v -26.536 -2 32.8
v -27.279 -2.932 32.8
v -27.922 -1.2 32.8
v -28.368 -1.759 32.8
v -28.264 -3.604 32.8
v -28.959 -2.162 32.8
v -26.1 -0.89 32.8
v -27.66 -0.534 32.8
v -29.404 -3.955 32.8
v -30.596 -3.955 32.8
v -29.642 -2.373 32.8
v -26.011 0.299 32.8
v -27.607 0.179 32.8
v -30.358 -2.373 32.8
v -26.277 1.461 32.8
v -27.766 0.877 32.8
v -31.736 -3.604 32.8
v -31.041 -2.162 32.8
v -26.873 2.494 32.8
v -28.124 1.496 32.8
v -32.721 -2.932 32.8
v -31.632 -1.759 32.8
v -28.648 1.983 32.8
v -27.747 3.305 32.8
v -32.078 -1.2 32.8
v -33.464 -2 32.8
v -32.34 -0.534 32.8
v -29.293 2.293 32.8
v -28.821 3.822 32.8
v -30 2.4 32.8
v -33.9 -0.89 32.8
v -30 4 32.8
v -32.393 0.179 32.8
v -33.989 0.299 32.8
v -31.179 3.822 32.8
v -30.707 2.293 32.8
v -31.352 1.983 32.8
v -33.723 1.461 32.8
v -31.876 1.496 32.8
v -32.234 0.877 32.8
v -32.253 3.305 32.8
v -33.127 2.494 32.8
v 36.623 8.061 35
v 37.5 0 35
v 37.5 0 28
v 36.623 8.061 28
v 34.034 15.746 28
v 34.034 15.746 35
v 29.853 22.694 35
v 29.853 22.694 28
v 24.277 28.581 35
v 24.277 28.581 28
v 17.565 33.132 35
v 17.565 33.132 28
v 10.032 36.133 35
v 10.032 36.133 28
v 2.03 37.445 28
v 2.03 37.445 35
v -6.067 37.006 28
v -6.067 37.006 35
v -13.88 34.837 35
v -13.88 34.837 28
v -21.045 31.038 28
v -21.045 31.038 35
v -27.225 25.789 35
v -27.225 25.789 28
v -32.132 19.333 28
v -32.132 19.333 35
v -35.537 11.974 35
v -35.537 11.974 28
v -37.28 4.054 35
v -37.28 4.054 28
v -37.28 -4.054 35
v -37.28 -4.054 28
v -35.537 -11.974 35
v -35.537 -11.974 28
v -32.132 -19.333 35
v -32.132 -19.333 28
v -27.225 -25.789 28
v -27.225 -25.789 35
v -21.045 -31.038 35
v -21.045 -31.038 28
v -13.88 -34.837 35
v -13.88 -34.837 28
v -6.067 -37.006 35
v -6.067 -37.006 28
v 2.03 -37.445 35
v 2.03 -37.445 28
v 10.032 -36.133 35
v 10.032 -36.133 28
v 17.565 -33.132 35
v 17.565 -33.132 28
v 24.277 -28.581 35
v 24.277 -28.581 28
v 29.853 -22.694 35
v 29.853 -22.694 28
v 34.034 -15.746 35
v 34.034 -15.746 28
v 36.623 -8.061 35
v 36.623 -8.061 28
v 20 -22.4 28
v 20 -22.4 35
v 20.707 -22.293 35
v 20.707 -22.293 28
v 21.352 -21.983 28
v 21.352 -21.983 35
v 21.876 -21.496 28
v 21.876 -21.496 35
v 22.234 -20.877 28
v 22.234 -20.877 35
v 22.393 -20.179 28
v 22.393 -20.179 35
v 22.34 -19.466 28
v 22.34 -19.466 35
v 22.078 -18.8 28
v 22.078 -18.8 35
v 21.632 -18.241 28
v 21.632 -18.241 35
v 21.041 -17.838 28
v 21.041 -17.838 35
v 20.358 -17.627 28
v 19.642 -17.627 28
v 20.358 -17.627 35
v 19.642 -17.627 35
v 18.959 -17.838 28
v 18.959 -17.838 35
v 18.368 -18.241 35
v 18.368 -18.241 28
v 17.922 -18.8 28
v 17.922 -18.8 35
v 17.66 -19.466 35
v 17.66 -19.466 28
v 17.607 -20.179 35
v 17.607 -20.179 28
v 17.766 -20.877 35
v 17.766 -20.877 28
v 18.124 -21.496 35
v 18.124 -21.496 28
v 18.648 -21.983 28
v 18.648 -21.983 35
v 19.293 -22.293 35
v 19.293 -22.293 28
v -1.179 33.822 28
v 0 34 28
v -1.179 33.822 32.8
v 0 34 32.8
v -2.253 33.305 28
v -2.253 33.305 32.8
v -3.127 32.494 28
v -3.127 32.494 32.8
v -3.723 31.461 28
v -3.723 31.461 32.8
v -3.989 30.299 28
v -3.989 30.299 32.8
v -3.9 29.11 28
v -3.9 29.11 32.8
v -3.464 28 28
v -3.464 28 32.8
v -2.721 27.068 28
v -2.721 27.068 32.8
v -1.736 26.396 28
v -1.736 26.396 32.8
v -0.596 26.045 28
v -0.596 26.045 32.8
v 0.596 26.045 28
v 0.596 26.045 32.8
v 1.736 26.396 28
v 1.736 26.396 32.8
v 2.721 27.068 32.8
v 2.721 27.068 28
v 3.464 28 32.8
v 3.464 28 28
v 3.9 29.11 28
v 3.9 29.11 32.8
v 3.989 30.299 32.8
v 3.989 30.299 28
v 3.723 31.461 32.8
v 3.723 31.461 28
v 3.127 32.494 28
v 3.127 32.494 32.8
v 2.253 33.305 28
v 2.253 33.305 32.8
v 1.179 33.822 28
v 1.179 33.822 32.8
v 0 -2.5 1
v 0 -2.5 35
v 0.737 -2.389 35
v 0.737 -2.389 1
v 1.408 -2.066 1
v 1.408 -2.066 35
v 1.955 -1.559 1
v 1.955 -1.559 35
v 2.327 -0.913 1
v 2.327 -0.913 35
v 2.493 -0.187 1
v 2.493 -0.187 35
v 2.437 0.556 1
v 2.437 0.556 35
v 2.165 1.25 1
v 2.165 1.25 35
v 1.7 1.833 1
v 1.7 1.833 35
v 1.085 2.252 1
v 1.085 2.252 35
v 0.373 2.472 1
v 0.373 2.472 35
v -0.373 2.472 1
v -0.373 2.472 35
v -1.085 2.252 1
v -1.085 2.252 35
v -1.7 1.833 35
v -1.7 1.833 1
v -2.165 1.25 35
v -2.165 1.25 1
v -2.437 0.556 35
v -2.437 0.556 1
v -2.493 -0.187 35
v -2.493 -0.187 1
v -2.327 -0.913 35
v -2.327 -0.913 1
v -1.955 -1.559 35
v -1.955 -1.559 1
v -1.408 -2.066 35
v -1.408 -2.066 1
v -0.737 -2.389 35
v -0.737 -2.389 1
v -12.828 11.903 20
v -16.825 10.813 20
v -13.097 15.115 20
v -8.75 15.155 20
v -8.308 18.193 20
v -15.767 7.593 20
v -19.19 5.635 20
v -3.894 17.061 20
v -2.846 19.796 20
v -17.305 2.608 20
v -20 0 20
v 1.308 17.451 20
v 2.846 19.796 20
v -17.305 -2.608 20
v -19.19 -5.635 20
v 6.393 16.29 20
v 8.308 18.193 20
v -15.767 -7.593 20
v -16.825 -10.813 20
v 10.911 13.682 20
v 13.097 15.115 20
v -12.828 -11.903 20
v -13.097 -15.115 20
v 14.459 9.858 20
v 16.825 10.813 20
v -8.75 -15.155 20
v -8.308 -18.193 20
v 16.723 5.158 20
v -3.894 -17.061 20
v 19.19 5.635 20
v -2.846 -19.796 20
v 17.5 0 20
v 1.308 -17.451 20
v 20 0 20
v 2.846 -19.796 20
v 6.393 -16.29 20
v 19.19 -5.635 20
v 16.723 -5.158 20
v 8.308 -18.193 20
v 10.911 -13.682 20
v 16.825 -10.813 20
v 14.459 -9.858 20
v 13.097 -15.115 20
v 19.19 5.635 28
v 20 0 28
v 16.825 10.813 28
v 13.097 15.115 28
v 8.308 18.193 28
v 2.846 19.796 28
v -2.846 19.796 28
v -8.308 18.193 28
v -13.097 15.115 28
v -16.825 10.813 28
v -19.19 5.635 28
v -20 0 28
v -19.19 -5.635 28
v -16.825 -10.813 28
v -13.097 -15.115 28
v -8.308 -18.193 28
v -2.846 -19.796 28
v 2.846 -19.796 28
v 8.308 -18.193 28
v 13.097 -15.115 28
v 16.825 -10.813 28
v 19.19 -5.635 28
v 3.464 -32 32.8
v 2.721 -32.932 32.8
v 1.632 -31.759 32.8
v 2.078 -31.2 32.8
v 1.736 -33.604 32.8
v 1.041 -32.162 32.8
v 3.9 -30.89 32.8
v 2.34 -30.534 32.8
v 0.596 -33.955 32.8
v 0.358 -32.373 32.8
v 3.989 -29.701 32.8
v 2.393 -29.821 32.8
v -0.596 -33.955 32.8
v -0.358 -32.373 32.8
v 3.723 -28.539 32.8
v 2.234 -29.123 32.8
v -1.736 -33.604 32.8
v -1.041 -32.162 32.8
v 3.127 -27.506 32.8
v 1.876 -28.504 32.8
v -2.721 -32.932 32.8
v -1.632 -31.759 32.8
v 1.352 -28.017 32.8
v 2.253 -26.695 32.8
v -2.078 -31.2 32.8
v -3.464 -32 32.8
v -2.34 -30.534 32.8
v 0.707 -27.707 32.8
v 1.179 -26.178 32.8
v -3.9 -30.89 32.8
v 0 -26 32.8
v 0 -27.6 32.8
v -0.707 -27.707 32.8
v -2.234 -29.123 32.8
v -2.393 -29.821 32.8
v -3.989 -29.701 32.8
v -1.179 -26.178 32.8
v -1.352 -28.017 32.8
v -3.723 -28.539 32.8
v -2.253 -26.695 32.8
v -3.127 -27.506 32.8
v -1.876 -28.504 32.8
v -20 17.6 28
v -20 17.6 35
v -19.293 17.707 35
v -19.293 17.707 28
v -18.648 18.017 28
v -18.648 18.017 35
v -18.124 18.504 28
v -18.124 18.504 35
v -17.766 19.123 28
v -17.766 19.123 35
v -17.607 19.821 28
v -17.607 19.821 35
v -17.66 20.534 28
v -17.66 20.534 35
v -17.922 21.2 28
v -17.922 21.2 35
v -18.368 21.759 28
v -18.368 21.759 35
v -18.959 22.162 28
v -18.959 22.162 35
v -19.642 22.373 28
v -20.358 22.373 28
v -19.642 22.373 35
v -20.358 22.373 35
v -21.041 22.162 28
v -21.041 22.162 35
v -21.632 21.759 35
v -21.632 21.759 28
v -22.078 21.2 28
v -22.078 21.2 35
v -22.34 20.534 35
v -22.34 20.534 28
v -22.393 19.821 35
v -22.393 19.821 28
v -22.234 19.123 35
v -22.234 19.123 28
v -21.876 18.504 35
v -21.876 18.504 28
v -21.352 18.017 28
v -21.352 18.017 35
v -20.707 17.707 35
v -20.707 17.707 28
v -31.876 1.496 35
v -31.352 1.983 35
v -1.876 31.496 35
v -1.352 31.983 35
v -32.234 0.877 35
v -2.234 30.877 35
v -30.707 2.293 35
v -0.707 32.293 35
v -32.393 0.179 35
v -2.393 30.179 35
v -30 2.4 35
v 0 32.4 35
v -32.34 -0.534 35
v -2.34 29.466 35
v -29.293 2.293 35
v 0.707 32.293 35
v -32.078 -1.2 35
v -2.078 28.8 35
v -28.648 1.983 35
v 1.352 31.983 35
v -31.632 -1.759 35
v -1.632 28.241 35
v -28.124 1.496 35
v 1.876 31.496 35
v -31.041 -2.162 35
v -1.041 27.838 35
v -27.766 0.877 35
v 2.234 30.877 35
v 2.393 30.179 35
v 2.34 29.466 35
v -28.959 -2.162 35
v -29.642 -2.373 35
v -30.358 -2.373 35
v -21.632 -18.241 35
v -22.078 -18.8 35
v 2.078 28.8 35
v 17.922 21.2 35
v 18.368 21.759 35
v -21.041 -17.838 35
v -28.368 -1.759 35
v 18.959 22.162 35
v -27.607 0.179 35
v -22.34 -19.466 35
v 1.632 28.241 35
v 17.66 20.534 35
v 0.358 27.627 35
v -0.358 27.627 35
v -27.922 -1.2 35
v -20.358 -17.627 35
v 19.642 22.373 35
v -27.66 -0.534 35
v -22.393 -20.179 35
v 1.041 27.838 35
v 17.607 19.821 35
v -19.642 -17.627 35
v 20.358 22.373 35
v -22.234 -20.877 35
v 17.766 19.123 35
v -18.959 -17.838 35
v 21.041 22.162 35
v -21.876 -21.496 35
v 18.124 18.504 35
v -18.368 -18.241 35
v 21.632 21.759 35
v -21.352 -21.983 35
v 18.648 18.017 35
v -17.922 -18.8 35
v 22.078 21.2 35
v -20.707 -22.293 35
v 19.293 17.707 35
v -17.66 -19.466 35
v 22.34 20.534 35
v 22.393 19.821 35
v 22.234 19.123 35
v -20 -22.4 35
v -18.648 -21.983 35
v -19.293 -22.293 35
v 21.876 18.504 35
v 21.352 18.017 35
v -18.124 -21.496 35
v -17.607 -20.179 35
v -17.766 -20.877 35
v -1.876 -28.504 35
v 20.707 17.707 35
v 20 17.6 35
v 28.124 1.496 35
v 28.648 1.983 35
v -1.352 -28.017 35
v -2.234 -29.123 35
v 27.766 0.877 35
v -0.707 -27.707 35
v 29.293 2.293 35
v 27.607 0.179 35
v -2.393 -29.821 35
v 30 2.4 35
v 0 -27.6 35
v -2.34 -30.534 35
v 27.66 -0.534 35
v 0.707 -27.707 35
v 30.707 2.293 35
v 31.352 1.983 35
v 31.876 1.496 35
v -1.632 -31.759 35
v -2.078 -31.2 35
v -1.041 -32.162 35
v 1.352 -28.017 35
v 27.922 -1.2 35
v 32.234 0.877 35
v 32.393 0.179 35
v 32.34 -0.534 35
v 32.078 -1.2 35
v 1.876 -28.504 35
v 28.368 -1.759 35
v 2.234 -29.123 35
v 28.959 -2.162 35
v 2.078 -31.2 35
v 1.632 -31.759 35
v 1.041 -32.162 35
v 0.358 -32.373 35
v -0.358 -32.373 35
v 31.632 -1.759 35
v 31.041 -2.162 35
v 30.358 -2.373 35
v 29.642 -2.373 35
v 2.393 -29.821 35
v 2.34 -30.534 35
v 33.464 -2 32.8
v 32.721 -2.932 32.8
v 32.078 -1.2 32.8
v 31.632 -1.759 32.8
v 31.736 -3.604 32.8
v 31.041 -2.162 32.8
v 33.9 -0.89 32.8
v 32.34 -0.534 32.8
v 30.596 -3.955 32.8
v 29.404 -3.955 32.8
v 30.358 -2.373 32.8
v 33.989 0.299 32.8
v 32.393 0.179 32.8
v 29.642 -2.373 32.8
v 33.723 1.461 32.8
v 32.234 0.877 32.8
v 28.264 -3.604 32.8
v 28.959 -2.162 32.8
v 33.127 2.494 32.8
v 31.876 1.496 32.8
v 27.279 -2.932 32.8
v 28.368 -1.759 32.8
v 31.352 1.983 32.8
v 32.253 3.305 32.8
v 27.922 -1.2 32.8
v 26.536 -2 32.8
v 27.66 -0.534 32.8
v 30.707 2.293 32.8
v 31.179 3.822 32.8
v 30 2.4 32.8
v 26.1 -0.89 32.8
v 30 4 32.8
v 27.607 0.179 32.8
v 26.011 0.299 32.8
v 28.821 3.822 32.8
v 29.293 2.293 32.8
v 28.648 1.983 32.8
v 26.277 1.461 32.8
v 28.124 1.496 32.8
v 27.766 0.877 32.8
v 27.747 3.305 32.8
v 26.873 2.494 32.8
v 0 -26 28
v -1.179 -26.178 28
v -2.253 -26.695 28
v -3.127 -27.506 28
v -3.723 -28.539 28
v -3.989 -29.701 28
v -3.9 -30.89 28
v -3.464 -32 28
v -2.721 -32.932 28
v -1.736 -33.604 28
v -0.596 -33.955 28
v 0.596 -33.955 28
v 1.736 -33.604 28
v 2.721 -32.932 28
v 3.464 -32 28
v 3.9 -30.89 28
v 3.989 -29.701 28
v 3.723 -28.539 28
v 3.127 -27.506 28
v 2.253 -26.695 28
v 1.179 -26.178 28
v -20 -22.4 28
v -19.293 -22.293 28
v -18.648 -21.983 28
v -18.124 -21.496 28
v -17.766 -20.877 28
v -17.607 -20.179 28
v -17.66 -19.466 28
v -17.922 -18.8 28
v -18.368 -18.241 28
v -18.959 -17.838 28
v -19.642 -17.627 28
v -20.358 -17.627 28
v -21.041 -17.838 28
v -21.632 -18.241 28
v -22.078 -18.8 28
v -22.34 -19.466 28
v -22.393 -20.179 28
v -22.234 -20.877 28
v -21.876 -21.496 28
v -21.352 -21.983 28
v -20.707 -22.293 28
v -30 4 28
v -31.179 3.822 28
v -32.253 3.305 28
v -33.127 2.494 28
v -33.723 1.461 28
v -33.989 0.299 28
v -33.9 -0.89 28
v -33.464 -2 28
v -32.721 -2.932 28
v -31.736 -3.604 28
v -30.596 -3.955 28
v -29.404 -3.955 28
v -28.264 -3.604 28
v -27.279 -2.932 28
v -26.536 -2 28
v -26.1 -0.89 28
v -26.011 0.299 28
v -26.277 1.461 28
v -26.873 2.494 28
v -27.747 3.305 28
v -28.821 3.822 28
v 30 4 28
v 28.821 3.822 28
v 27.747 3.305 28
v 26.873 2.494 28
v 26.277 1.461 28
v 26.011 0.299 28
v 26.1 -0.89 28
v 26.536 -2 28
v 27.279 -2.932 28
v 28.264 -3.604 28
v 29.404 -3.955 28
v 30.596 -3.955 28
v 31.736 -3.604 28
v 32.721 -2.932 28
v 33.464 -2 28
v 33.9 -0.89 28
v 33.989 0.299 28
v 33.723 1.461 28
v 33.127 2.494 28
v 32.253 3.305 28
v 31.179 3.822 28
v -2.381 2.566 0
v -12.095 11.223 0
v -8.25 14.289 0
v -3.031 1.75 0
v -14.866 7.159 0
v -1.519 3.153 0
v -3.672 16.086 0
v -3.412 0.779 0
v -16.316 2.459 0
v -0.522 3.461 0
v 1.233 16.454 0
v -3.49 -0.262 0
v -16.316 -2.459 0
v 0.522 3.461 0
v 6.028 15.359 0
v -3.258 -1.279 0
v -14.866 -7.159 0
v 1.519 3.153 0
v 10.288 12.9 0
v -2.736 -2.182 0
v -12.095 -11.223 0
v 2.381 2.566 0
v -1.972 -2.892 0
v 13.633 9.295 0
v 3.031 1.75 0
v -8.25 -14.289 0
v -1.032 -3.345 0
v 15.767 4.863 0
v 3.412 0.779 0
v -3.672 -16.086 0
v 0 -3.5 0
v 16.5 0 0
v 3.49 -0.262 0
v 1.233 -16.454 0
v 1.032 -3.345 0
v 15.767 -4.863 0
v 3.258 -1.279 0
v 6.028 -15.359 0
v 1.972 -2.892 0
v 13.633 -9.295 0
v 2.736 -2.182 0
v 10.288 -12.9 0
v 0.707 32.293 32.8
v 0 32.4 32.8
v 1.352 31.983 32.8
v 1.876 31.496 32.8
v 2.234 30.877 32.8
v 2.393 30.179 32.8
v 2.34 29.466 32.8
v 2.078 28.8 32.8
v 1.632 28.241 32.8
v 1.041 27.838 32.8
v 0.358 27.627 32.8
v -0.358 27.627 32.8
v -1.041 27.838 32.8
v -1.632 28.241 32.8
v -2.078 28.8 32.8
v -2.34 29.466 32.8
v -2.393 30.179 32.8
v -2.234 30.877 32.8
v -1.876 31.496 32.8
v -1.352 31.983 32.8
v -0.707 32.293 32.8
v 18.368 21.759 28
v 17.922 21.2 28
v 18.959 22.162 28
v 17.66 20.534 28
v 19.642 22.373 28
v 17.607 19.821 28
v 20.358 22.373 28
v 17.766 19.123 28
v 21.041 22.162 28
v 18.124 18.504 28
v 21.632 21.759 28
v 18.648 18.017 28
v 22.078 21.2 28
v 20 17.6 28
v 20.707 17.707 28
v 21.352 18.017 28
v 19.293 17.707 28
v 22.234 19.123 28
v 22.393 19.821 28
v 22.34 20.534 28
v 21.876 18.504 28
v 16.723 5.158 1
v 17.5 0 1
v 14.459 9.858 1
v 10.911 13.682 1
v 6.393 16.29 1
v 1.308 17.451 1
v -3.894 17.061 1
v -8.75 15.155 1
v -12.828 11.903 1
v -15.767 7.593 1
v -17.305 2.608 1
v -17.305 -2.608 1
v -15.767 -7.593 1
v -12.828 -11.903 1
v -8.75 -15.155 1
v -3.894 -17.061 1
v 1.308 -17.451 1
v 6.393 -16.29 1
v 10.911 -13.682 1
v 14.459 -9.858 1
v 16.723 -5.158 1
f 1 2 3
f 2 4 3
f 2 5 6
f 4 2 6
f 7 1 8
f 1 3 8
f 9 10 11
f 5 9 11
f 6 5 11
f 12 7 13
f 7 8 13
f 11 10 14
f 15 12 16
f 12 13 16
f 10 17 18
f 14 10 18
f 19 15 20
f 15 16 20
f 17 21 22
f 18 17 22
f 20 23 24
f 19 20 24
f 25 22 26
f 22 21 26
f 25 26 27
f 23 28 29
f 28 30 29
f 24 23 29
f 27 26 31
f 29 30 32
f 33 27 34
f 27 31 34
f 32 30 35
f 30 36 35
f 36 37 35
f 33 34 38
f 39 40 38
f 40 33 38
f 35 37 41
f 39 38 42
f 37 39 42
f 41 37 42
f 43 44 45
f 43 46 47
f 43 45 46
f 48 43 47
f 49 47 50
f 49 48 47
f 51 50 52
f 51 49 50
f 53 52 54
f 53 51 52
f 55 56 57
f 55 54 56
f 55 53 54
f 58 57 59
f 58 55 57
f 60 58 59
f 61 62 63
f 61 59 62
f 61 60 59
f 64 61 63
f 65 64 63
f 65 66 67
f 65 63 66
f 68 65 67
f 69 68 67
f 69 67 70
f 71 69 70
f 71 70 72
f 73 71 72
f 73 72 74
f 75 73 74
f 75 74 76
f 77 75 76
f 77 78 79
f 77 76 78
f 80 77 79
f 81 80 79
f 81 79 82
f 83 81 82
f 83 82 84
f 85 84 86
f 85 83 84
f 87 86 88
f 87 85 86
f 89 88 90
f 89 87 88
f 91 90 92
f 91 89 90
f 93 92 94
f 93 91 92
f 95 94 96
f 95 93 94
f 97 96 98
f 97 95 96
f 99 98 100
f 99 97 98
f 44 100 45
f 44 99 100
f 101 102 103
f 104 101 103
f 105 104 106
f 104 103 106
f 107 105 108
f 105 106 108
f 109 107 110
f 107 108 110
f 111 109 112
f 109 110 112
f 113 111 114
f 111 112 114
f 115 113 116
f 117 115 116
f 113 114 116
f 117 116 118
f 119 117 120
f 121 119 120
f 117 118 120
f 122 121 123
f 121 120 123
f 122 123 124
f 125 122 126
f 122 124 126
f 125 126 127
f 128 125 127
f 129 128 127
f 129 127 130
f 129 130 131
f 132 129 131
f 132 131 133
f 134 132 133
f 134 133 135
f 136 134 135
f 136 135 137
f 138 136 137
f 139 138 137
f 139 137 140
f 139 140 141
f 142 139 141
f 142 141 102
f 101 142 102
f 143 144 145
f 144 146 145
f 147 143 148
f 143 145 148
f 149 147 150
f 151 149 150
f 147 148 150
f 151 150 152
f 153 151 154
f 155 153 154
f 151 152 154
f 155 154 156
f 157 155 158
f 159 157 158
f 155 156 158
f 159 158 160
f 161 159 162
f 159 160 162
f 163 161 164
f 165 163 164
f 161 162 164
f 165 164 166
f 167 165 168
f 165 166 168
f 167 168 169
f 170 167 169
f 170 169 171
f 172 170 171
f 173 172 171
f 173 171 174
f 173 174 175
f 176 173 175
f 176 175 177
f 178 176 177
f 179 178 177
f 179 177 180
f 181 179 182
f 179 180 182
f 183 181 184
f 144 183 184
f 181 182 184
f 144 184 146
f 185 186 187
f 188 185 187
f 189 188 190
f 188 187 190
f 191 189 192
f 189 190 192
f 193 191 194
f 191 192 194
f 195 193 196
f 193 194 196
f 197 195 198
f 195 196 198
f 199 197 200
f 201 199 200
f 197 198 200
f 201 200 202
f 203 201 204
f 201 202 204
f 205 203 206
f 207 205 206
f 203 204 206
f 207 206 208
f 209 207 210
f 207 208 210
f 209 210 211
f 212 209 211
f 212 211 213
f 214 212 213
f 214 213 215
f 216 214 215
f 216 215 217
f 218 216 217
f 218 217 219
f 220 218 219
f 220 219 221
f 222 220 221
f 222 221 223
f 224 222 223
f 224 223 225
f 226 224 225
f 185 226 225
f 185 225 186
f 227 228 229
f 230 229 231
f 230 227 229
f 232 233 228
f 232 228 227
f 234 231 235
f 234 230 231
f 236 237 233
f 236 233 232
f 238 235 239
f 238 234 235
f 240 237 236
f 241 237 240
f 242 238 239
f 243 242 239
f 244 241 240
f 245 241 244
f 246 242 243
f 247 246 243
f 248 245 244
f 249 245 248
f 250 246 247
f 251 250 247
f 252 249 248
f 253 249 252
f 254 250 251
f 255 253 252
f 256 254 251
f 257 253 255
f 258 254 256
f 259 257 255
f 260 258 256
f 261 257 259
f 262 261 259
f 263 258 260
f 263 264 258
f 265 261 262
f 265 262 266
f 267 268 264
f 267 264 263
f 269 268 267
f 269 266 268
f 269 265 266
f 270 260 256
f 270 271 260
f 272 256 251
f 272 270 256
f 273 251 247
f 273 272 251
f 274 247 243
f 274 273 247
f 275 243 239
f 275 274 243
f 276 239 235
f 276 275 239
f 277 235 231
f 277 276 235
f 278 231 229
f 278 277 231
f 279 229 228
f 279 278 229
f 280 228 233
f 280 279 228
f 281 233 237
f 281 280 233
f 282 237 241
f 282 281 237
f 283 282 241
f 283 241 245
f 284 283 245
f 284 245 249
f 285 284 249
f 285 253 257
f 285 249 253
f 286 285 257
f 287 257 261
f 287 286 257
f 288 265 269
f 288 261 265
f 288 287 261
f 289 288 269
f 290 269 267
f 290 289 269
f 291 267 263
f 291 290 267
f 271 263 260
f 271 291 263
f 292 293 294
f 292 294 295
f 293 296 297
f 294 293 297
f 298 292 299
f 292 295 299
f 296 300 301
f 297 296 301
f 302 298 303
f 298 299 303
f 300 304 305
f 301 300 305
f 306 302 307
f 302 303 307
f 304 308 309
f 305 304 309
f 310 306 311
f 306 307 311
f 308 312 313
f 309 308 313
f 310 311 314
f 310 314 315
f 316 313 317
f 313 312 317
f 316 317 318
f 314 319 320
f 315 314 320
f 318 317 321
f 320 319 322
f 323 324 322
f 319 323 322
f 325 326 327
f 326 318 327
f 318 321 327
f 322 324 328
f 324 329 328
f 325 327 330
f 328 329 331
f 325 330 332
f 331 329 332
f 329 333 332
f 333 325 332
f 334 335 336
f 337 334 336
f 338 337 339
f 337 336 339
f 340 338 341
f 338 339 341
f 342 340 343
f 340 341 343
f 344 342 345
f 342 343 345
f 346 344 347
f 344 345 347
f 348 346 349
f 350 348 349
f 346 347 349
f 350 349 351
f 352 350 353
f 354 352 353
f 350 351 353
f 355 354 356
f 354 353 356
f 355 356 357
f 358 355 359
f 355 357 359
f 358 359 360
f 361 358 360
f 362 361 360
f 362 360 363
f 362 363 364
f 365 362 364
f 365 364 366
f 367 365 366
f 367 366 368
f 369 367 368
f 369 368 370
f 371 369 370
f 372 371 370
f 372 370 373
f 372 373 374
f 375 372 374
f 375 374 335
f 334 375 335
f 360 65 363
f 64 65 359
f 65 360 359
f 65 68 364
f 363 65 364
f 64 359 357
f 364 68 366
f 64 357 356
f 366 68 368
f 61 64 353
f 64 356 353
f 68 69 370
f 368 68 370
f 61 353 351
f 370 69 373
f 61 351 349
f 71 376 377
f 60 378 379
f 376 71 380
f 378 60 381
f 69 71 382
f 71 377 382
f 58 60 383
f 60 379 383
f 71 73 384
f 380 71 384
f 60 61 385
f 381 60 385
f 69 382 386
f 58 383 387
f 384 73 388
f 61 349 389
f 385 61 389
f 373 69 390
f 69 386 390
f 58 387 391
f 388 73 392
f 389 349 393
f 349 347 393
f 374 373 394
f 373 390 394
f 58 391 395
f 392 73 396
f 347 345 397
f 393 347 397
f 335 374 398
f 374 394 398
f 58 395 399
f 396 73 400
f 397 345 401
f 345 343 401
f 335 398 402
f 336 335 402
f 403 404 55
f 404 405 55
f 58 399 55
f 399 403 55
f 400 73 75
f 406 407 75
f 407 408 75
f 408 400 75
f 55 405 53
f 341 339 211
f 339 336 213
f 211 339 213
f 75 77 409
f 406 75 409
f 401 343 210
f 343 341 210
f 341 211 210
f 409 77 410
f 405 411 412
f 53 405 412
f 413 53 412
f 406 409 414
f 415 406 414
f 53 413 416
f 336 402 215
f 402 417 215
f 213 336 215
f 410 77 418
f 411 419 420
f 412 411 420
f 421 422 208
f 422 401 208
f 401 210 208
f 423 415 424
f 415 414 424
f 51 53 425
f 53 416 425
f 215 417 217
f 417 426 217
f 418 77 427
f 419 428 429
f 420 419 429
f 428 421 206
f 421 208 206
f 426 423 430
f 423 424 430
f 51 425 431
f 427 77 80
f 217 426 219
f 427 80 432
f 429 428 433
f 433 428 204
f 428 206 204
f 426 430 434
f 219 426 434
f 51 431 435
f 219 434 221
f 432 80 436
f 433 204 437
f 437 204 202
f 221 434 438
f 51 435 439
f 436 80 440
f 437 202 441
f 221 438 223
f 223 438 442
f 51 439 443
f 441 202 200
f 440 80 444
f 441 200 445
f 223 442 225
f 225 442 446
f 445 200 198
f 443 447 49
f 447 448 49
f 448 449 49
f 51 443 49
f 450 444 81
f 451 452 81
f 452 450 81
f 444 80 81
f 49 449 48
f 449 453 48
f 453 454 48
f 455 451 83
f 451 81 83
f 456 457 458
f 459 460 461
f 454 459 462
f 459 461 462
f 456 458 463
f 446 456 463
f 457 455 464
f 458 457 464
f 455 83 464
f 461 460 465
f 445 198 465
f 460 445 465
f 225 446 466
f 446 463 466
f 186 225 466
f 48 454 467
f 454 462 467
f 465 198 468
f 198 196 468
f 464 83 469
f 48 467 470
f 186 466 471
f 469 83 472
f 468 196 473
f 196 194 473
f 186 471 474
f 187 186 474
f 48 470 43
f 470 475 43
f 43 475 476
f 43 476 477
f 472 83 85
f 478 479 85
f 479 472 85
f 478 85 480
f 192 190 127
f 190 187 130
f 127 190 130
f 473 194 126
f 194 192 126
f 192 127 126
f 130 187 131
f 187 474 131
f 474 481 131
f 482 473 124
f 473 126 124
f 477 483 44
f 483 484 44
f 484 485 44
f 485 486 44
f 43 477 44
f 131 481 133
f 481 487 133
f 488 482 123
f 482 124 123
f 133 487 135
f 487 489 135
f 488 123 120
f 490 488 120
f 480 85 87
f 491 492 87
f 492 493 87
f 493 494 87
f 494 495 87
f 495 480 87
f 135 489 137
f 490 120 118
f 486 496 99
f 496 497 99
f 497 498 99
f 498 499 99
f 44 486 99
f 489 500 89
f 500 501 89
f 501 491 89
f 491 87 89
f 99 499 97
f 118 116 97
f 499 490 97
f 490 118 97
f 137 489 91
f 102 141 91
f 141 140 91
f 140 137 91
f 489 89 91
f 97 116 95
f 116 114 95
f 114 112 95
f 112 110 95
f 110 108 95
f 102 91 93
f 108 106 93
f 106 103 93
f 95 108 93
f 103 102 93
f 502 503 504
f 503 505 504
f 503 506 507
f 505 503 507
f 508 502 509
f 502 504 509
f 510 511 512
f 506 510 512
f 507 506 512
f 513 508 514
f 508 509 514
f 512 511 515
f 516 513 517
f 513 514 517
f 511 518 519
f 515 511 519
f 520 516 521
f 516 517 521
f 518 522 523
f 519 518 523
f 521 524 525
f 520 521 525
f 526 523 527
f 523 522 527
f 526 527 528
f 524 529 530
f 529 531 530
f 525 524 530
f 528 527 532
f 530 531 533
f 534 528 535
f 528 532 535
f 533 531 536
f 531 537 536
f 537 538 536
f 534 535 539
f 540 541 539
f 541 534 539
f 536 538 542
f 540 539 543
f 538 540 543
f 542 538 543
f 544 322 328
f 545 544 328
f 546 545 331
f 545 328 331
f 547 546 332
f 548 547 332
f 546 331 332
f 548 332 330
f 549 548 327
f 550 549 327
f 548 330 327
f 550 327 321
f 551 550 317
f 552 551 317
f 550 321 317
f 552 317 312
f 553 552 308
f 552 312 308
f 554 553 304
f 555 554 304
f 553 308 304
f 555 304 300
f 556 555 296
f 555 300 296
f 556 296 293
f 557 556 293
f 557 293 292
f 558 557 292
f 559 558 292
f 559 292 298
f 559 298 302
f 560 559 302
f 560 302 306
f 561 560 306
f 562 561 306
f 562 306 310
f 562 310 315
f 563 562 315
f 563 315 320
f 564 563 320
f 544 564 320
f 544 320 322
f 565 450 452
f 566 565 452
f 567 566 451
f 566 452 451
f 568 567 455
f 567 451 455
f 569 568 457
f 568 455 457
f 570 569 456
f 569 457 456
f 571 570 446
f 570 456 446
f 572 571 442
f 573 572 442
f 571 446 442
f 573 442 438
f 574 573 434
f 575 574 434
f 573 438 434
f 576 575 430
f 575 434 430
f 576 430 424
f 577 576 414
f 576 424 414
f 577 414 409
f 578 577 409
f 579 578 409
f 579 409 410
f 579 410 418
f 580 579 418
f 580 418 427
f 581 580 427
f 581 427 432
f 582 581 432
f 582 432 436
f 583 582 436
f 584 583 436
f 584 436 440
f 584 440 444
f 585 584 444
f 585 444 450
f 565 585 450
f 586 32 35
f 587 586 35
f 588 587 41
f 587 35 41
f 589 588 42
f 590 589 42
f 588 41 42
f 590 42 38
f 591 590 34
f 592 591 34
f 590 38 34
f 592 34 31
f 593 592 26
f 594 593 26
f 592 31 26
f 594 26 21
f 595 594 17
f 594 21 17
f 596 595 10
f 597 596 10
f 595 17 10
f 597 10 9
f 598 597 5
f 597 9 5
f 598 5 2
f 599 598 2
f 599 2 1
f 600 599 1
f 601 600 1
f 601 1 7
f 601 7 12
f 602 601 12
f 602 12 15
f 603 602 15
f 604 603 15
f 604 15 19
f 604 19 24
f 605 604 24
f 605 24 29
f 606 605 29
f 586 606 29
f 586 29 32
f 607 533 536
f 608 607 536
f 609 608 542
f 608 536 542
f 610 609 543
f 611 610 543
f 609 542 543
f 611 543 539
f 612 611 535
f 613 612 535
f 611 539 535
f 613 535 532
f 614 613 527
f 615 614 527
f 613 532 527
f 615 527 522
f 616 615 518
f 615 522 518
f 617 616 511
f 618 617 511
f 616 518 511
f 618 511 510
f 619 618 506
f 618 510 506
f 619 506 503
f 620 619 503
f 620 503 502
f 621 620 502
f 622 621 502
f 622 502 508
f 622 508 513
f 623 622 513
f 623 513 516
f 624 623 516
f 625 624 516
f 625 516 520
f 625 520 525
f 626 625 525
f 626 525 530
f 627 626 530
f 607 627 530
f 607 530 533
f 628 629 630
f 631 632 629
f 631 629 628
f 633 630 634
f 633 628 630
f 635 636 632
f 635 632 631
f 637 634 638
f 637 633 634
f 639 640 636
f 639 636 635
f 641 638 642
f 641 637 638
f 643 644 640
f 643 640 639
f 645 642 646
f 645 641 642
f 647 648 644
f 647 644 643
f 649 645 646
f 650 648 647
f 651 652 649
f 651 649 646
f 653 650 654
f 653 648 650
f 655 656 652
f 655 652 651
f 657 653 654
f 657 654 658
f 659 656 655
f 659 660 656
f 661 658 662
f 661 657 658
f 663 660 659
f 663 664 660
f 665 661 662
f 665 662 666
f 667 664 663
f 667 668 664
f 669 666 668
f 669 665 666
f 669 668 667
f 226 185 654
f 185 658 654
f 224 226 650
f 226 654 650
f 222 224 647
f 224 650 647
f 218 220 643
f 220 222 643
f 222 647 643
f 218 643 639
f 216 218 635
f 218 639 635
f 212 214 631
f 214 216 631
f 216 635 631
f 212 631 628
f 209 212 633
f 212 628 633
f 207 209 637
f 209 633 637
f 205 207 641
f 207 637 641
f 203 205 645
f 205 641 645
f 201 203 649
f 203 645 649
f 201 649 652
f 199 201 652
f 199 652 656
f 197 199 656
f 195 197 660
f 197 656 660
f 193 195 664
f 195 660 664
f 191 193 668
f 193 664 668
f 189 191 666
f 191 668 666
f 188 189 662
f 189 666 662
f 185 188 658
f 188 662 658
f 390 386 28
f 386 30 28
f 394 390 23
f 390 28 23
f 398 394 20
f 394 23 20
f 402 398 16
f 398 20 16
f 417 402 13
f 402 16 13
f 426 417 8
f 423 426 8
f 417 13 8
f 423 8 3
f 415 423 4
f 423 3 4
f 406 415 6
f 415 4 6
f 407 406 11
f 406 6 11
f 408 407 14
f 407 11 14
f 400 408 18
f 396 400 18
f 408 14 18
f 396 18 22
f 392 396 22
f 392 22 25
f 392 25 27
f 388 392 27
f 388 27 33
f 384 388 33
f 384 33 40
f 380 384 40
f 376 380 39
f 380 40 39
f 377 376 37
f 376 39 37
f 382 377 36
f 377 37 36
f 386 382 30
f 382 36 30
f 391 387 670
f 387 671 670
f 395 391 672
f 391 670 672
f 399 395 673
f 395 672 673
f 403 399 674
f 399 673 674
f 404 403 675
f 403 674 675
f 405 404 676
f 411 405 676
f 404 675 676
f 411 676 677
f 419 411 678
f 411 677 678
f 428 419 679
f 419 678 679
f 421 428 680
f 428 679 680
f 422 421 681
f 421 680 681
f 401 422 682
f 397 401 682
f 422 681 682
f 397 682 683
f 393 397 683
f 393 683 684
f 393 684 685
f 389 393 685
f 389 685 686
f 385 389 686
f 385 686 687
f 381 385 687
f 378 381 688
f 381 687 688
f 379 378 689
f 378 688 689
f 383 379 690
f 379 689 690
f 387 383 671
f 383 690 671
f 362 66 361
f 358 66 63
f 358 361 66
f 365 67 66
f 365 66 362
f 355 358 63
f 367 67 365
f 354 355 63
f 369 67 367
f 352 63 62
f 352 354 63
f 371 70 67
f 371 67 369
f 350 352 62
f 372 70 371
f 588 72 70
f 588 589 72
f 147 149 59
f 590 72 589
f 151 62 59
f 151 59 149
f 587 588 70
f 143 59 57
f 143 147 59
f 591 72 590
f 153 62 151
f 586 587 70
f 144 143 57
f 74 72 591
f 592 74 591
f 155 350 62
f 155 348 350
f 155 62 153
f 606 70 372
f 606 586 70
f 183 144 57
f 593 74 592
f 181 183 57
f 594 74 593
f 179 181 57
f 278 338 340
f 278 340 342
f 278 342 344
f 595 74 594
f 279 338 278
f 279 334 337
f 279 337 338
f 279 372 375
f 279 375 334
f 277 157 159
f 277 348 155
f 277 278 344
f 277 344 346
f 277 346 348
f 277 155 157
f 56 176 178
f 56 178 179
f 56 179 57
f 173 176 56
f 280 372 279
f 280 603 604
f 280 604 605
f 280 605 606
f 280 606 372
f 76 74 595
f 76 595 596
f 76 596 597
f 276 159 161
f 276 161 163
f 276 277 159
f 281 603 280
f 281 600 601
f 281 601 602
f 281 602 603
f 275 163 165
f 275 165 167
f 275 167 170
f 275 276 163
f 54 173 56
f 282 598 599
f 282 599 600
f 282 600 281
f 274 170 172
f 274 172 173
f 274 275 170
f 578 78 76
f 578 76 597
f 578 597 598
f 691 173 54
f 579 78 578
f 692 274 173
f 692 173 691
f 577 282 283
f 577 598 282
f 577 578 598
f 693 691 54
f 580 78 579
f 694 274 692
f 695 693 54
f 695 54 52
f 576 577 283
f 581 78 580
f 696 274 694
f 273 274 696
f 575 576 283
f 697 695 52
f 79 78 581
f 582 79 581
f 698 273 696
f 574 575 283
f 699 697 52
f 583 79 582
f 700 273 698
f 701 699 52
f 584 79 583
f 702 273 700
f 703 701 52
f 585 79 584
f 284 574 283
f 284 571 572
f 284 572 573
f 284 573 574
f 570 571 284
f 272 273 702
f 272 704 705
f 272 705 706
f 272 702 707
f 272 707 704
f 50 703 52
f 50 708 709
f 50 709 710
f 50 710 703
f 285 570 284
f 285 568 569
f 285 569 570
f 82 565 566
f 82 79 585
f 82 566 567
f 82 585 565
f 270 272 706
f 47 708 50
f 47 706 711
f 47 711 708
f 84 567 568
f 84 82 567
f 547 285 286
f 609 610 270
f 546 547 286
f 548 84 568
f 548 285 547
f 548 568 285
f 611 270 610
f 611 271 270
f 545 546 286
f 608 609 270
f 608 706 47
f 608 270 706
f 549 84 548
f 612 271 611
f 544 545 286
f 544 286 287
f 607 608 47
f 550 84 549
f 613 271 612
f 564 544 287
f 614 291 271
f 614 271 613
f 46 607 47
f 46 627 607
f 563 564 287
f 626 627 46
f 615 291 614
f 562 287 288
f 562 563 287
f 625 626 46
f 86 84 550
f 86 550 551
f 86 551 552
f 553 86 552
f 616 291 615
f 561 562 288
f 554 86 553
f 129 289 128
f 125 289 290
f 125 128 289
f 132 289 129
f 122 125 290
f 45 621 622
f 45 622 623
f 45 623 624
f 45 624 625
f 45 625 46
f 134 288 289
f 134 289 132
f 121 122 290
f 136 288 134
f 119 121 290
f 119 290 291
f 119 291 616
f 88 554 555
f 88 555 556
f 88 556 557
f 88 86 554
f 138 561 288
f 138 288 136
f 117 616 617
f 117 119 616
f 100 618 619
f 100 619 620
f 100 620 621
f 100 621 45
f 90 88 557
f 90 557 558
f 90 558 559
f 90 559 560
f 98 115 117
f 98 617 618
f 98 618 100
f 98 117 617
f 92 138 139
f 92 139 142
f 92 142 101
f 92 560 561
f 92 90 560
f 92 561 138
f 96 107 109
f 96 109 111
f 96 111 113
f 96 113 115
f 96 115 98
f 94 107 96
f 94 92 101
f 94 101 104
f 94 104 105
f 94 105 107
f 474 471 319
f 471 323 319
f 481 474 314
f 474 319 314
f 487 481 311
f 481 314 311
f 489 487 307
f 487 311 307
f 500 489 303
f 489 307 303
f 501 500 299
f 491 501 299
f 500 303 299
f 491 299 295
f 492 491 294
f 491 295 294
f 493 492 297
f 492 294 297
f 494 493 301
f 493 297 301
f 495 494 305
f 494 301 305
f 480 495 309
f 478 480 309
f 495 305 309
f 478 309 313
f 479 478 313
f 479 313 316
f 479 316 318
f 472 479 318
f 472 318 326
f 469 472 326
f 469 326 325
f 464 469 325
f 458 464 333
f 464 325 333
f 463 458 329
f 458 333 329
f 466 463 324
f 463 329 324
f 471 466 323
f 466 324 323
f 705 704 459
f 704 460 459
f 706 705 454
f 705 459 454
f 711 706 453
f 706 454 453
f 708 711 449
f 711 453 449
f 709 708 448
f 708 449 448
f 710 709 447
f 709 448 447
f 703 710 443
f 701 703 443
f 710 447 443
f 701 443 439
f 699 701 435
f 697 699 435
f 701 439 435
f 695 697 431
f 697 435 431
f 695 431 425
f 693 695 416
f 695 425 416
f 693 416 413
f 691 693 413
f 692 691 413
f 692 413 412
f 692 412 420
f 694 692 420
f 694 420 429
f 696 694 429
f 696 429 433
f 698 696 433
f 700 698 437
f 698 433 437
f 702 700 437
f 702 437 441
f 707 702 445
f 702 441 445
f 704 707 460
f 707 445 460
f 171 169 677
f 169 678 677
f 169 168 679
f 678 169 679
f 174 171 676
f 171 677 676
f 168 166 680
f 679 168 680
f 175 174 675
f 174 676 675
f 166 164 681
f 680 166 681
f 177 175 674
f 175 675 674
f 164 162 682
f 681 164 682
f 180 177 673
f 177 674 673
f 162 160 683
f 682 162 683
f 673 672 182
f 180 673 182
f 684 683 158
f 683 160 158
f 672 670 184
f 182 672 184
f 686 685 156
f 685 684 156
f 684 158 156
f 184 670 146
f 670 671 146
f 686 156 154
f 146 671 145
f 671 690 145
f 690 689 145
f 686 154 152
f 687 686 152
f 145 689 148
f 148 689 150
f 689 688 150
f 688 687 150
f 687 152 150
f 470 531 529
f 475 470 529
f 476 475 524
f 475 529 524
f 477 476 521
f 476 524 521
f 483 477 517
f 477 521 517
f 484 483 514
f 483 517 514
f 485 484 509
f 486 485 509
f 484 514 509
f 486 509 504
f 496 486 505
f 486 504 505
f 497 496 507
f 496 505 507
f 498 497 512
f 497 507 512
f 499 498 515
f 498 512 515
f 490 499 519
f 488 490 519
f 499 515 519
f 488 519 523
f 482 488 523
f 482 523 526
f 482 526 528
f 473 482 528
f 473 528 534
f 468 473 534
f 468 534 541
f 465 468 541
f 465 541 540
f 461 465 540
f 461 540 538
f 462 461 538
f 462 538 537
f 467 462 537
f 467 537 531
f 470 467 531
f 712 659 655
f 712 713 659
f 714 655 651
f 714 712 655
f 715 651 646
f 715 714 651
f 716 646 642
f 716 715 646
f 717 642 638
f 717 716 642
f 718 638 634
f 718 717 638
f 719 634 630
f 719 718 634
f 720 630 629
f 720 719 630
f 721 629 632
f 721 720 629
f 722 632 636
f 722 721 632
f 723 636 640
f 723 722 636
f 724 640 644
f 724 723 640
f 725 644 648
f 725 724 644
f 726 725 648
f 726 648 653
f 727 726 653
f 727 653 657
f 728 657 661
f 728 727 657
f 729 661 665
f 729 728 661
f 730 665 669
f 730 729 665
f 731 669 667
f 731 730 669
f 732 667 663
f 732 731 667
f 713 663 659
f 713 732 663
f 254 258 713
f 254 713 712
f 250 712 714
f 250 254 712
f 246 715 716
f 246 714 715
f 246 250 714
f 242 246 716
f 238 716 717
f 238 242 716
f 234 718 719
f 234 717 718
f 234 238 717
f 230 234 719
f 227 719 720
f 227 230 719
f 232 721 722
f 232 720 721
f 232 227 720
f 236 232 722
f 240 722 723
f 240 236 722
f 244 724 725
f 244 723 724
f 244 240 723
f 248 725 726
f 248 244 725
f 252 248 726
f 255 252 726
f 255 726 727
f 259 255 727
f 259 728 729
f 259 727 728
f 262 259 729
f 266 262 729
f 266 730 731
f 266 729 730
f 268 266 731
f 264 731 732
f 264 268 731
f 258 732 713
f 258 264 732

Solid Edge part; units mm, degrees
sketch "Sketch1" plane through (0, 0, 0) normal (0, -1, 0) x (1, 0, 0)
  line L0 (0, 0) -> (17.5, 0)
  line L1 (17.5, 0) -> (17.5, 20)
  line L2 (17.5, 20) -> (20, 20)
  line L3 (20, 20) -> (20, 28)
  line L4 (20, 28) -> (37.5, 28)
  line L5 (37.5, 28) -> (37.5, 35)
  line L6 (37.5, 35) -> (0, 35)
  dimension "D1" = 20
  dimension "D2" = 7
  dimension "D3" = 8
revolve "RevolvedProtrusion1" add sketch "Sketch1" angle 360 about axis through (0, 0, 35) along (0, 0, -1)
chamfer "Chamfer1" distance 1 angle 45 1 edges at (-17.5, 0, 0)
hole "Hole_1" at (0, 0, 35) direction (0, 0, -1) diameter 5 end up to next
chamfer "Chamfer_2" distance 1 angle 45 1 edges at (-2.5, 0, 0)
hole "Hole_2" at (20, 20, 35) direction (0, 0, -1) diameter 4.8 end up to next
hole "Hole1" at (20, -20, 35) direction (0, 0, -1) diameter 4.8 end up to next
hole "Hole2" at (-20, -20, 35) direction (0, 0, -1) diameter 4.8 end up to next
hole "Hole3" at (-20, 20, 35) direction (0, 0, -1) diameter 4.8 end up to next
hole "Hole_6" at (0, -30, 28) direction (0, 0, 1) diameter 4.8 end up to next counterbore diameter 8 counterbore depth 4.8
hole "Hole4" at (30, 0, 28) direction (0, 0, 1) diameter 4.8 end up to next counterbore diameter 8 counterbore depth 4.8
hole "Hole5" at (0, 30, 28) direction (0, 0, 1) diameter 4.8 end up to next counterbore diameter 8 counterbore depth 4.8
hole "Hole6" at (-30, 0, 28) direction (0, 0, 1) diameter 4.8 end up to next counterbore diameter 8 counterbore depth 4.8
properties material "Polyethylene, low density"
